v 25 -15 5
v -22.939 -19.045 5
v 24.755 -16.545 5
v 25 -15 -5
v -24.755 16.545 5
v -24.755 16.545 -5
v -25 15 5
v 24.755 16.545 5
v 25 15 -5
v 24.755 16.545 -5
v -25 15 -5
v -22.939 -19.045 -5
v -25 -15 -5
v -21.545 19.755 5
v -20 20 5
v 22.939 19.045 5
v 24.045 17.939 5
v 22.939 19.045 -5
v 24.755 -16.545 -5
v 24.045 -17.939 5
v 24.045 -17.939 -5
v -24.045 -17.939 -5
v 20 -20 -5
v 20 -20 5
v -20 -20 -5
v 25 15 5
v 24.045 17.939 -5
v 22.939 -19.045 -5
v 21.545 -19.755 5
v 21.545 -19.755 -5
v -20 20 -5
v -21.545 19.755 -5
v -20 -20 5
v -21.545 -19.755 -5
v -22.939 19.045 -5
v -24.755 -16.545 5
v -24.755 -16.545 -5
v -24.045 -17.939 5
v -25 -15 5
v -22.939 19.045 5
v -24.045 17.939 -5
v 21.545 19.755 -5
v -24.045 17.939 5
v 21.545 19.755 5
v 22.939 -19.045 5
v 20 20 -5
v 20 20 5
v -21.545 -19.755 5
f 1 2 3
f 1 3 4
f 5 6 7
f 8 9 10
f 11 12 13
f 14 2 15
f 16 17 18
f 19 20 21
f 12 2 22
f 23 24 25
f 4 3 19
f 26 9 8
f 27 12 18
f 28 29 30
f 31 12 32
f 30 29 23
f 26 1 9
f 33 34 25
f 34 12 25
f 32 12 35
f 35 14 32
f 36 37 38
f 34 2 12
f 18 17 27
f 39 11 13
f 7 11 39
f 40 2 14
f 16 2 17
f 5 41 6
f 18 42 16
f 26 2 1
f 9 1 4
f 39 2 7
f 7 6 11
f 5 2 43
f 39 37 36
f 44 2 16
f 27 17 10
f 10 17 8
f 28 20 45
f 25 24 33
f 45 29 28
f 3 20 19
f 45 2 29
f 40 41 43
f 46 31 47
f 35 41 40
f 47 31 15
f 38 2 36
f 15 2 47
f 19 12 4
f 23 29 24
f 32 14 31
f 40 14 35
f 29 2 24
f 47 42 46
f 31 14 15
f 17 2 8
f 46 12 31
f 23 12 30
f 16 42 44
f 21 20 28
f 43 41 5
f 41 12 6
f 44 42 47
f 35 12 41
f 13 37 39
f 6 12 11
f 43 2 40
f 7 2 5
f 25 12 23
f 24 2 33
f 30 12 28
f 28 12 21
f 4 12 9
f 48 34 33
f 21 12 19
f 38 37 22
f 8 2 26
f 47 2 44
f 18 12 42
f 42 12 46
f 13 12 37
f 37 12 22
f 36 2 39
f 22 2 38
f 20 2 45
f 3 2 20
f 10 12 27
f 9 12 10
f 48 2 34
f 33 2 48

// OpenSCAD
lx=50;
ly=40;
r=5;
h=10;

cx= lx/2-r;
cy= ly/2 -r;

P1=[cx,cy,0];
P2=[-cx,cy,0];
P3=[-cx,-cy,0];
P4=[cx,-cy,0];

hull(){
       
    translate(P1)
            cylinder(r=r, h=h,      center=true, $fn=20);
            
    translate(P2)
            cylinder(r=r, h=        h, center=true, $fn=20);
        
    translate(P3)
            cylinder(r=r, h=        h, center=true, $fn=20);

    translate(P4)
            cylinder(r=r, h=        h, center=true, $fn=20);
} 
